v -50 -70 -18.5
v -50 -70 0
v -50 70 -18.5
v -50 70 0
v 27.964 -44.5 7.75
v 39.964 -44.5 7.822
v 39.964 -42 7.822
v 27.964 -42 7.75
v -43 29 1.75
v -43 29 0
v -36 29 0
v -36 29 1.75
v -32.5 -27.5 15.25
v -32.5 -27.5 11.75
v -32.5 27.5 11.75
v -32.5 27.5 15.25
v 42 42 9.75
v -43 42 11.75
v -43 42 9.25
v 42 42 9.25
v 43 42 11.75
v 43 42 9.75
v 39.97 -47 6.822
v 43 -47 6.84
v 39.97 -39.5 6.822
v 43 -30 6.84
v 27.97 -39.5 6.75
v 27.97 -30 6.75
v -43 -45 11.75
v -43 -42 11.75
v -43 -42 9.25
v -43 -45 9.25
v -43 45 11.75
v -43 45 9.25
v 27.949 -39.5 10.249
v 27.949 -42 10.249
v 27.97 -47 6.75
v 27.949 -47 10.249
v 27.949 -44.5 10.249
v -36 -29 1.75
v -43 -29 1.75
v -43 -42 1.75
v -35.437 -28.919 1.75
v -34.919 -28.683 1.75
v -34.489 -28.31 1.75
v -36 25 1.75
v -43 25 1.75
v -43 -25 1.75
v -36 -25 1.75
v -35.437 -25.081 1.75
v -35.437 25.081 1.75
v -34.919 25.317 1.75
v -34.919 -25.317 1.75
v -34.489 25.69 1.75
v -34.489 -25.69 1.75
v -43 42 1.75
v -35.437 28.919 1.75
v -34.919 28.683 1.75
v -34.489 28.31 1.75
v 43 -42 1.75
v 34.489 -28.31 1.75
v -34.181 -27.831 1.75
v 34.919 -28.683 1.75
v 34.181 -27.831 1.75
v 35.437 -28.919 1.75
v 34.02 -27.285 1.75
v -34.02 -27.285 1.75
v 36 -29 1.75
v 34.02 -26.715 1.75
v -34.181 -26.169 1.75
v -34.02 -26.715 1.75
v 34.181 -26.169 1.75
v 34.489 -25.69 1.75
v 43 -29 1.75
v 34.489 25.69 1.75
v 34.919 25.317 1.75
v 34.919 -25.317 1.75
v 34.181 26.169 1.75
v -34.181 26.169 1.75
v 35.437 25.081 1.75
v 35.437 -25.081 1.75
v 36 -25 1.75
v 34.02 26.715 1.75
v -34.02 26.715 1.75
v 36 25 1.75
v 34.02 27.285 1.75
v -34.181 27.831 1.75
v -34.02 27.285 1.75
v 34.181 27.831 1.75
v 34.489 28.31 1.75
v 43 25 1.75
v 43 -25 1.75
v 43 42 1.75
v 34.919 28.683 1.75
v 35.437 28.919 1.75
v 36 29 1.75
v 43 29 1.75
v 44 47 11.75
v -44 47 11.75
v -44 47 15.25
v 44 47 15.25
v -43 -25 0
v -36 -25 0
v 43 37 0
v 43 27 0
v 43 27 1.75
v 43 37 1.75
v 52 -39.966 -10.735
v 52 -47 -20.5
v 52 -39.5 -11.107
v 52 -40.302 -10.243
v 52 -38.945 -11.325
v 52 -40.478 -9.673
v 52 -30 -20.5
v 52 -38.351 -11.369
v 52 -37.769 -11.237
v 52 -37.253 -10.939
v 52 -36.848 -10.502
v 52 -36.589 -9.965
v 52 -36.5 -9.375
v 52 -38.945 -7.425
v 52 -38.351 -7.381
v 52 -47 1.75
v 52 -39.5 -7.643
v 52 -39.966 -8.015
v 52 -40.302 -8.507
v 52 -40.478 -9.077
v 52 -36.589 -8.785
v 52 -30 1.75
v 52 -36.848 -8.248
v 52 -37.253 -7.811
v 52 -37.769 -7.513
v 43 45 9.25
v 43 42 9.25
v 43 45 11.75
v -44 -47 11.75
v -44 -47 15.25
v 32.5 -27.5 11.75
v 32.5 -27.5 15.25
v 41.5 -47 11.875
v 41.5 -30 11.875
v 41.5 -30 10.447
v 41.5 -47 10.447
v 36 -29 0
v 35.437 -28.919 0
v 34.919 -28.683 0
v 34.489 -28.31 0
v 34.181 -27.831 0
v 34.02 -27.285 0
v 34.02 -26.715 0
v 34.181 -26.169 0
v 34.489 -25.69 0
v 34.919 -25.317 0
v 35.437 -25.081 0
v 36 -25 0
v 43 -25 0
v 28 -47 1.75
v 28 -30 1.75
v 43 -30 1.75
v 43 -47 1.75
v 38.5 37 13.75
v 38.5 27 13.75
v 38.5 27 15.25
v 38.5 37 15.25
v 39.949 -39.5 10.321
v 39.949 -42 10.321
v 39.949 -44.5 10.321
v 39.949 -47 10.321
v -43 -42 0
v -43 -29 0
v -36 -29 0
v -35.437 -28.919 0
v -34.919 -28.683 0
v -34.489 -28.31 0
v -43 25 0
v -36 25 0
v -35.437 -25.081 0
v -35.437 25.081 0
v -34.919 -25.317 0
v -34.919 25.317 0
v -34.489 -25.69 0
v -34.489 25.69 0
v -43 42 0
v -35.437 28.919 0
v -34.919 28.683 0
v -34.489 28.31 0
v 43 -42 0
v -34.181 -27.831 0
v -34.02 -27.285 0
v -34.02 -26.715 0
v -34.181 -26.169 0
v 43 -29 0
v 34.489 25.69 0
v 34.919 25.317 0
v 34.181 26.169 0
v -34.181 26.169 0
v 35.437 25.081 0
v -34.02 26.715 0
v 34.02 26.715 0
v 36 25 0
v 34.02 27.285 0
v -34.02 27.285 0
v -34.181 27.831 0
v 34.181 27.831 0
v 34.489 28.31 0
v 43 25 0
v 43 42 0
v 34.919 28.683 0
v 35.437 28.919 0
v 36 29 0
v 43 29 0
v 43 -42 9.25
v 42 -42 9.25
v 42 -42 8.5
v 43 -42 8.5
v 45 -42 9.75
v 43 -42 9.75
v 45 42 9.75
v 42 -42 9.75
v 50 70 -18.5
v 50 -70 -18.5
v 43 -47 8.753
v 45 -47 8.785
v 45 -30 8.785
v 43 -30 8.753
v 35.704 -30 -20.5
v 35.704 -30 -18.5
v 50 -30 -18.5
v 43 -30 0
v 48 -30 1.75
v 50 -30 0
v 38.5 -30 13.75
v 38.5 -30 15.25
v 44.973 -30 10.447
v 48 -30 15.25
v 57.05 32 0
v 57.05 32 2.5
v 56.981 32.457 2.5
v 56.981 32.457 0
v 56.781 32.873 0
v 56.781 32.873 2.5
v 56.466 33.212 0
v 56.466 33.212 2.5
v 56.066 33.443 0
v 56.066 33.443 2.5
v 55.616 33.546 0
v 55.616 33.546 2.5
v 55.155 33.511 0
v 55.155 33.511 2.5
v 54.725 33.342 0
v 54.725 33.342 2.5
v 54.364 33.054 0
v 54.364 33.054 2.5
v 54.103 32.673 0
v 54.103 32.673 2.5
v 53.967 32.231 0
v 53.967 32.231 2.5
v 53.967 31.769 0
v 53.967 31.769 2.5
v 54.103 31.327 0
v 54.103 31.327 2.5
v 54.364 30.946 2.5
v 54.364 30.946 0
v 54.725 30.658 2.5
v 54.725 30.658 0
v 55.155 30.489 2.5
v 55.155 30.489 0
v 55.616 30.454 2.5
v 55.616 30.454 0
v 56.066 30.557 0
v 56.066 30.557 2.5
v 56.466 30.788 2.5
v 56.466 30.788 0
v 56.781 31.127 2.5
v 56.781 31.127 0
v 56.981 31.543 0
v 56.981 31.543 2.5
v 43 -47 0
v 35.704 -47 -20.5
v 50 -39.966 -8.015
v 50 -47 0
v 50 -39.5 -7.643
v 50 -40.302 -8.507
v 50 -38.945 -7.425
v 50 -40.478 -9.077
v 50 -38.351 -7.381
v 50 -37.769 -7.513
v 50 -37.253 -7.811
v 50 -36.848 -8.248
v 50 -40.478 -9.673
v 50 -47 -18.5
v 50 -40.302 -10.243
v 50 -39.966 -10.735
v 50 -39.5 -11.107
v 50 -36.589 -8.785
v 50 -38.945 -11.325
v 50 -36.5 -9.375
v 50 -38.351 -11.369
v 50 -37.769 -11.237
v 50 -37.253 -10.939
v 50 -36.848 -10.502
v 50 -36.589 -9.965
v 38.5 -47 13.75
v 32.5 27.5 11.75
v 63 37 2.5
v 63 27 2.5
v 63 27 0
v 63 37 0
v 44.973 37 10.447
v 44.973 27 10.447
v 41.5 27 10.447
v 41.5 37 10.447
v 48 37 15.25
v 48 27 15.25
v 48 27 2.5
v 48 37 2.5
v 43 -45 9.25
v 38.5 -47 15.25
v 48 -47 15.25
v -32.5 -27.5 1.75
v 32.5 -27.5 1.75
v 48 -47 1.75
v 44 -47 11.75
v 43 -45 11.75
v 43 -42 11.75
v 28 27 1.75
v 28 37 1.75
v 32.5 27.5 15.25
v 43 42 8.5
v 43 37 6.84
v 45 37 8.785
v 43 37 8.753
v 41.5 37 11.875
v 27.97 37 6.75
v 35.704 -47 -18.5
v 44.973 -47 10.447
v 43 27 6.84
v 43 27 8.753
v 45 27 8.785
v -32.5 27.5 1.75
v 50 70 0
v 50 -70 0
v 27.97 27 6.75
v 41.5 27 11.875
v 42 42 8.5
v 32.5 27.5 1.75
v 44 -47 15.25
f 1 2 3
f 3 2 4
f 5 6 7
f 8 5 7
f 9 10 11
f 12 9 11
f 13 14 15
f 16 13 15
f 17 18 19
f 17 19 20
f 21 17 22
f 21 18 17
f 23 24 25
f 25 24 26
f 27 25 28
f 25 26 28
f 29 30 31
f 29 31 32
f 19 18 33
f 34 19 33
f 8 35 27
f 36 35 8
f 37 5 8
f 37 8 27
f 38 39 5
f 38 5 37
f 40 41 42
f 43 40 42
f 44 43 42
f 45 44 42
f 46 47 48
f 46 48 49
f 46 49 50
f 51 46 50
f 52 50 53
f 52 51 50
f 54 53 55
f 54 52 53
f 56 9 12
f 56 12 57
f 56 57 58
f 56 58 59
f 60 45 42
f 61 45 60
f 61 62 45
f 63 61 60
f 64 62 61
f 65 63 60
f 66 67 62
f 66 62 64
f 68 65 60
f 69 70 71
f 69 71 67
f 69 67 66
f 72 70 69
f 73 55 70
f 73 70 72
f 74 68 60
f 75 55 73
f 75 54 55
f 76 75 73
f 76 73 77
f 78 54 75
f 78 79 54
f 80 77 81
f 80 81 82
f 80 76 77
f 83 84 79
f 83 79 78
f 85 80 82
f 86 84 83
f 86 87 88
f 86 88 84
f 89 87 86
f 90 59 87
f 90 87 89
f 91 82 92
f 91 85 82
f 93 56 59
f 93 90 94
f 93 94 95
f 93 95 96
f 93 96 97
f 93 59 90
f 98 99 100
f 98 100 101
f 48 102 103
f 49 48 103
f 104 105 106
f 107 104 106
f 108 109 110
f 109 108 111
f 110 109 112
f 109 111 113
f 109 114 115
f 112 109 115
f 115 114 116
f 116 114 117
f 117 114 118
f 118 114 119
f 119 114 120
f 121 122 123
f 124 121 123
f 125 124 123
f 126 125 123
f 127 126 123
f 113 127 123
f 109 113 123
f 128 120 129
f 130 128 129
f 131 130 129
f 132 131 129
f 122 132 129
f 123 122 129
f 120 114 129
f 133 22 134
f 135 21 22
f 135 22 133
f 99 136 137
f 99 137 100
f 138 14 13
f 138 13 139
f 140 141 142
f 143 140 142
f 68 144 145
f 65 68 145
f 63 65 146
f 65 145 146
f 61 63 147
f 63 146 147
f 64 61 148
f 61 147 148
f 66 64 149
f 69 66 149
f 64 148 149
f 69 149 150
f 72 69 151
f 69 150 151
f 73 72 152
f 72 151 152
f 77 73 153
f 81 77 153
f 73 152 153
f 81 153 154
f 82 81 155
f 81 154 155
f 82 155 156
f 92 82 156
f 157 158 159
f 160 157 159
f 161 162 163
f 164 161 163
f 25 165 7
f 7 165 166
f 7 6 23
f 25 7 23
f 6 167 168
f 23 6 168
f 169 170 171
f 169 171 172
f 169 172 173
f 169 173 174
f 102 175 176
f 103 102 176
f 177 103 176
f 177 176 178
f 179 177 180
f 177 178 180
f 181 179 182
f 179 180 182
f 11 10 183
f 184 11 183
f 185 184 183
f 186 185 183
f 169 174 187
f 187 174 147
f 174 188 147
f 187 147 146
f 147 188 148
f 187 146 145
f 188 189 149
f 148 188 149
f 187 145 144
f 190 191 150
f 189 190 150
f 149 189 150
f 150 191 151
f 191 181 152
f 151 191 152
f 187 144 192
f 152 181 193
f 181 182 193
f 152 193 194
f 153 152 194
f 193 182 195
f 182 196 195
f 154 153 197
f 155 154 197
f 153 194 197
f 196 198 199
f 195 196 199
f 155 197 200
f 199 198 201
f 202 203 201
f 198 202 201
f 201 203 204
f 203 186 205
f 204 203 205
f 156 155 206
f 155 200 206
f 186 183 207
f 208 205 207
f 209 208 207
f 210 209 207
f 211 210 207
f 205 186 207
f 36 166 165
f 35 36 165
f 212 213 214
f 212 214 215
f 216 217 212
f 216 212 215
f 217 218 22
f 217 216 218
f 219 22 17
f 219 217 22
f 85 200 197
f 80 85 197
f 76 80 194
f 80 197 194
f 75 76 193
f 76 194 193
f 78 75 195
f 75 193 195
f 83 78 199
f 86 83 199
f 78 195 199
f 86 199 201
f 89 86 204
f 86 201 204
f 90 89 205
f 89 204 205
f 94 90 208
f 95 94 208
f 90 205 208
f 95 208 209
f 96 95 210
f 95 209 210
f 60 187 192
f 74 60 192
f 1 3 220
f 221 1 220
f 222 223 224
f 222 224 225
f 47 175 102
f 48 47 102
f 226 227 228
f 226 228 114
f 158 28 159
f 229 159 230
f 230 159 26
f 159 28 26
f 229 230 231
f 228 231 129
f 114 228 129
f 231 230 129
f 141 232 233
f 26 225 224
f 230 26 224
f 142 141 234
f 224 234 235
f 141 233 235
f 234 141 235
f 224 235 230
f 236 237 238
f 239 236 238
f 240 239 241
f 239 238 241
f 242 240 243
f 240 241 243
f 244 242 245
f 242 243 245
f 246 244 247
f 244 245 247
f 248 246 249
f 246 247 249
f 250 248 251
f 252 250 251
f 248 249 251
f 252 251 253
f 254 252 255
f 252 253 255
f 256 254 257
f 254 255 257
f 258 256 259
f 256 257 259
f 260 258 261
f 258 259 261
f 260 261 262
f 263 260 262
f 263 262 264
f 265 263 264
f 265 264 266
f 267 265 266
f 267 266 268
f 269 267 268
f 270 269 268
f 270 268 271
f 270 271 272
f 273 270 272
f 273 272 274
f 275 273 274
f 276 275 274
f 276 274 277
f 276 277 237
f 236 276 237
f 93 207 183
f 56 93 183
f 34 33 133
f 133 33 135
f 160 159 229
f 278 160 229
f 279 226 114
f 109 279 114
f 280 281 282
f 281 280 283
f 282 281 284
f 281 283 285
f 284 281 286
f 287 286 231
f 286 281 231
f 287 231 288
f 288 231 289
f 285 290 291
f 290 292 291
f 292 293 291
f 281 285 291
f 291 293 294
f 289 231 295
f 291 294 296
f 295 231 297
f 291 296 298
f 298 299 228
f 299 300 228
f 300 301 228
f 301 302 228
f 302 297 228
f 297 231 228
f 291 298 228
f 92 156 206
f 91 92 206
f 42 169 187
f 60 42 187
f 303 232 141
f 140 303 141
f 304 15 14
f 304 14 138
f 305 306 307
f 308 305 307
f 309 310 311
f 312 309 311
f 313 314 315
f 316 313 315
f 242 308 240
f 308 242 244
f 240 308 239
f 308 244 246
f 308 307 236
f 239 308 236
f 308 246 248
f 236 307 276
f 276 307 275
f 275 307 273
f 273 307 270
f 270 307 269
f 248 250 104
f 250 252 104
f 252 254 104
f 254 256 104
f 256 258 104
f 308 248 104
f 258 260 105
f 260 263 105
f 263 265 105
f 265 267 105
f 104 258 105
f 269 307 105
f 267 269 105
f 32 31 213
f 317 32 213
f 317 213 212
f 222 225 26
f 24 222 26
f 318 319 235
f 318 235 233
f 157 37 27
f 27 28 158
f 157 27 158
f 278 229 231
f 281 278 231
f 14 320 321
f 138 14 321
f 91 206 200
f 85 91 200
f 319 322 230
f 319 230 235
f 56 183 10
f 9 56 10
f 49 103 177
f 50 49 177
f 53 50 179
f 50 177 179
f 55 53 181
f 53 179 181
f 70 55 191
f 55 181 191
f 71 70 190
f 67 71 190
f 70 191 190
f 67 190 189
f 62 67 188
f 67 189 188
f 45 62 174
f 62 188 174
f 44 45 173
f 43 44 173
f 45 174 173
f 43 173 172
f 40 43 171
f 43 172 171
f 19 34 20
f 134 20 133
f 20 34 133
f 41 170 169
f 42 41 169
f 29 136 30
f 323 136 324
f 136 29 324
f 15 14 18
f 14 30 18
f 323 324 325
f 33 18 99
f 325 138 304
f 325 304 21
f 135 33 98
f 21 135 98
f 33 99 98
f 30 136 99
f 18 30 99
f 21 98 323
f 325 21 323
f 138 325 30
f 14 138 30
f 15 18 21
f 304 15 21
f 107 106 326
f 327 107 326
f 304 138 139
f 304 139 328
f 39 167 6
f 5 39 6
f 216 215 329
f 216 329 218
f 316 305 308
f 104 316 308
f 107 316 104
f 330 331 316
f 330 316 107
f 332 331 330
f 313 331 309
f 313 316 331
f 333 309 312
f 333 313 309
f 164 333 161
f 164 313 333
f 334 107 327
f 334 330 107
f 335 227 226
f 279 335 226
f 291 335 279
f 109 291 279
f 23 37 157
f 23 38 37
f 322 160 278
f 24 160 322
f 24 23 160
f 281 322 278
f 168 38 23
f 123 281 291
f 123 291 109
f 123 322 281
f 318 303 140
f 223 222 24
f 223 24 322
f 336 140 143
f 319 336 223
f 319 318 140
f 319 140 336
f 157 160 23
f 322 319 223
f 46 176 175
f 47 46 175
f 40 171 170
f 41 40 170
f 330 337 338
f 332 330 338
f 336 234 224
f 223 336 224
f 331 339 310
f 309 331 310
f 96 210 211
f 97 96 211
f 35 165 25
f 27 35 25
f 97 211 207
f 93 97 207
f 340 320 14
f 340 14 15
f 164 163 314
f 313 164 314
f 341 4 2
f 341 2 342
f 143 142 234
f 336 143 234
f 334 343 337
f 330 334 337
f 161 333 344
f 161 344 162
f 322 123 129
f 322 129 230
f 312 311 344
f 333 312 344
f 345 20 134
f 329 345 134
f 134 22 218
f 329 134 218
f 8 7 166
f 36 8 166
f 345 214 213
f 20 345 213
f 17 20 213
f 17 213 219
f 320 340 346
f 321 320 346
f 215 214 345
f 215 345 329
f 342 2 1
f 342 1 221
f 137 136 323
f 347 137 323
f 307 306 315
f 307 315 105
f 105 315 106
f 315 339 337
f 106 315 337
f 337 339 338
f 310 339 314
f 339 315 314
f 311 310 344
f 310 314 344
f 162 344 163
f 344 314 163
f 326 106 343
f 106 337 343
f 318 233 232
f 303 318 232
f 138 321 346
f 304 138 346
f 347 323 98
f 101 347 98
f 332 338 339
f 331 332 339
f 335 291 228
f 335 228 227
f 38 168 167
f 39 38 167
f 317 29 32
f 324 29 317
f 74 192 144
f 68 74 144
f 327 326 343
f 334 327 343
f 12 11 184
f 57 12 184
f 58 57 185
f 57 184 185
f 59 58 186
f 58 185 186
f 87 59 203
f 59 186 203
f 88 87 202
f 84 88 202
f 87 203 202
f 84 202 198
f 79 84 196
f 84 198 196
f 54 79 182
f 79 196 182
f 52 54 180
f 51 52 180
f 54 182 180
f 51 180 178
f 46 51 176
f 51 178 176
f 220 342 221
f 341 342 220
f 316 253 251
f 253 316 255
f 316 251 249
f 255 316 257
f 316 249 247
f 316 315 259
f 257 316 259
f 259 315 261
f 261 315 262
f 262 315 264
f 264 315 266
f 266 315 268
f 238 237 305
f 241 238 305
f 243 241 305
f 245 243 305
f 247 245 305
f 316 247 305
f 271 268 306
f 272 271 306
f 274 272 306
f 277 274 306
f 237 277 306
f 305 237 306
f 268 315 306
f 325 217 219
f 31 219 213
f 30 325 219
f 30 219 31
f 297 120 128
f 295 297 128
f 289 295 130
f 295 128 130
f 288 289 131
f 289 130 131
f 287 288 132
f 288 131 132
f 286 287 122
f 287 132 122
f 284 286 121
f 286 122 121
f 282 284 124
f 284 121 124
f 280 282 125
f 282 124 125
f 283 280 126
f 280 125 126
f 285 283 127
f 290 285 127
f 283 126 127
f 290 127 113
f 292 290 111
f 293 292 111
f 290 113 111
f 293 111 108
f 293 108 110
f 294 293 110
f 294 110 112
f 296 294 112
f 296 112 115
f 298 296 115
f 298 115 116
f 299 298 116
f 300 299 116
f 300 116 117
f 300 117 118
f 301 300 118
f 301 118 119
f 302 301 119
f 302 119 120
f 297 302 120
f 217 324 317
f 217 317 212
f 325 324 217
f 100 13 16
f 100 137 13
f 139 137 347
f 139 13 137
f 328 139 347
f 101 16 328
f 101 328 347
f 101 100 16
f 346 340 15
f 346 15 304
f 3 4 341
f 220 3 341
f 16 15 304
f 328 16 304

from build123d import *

# Parameters (mm, degrees)
F0_W           = 100
F0_H           = 140
F1_DEPTH       = 18.5
F3_DEPTH       = 1.75
F4_W           = 65
F4_H           = 55
F5_DEPTH       = 10
F6_W           = 88
F6_H           = 94
F6_W_2         = 86
F6_H_2         = 84
F6_W_3         = 65
F6_H_3         = 55
F6_H_4         = 3
F7_DEPTH       = 3.5
F8_DEPTH       = 2.5
F9_W           = 1
F9_H           = 1.25
F10_DEPTH      = 42
F10_DEPTH_BACK = 42
F12_DEPTH      = 47
F13_DEPTH      = 30
F15_DEPTH      = 12
F16_R          = 2
F17_DEPTH      = 3
F20_DEPTH      = 10
F21_R          = 1.55
F22_DEPTH      = 25


with BuildPart() as f1:
    # F0 (on Top) → F1 (new body)
    with BuildSketch(Plane.XY):
        Rectangle(F0_W, F0_H)
    extrude(amount=-F1_DEPTH)


with BuildPart() as f3:
    # F2 (on Top) → F3 (new body)
    with BuildSketch(Plane.XY):
        with BuildLine():
            Line((43, 42), (-43, 42))
            Line((-43, 42), (-43, 29))
            Line((-43, 29), (-36, 29))
            ThreePointArc((-36, 29), (-34, 27), (-36, 25))
            Line((-36, 25), (-43, 25))
            Line((-43, 25), (-43, -25))
            Line((-43, -25), (-36, -25))
            ThreePointArc((-36, -25), (-34, -27), (-36, -29))
            Line((-36, -29), (-43, -29))
            Line((-43, -29), (-43, -42))
            Line((-43, -42), (43, -42))
            Line((43, -42), (43, -29))
            Line((43, -29), (36, -29))
            ThreePointArc((36, -29), (34, -27), (36, -25))
            Line((36, -25), (43, -25))
            Line((43, -25), (43, 25))
            Line((43, 25), (36, 25))
            ThreePointArc((36, 25), (34, 27), (36, 29))
            Line((36, 29), (43, 29))
            Line((43, 29), (43, 42))
        make_face()
    extrude(amount=F3_DEPTH)


with BuildPart() as f5:
    # F4 (on face) → F5 (new body)
    with BuildSketch(Plane.XY.offset(1.75)):
        Rectangle(F4_W, F4_H)
    extrude(amount=F5_DEPTH)


with BuildPart() as f7:
    # F6 (on face) → F7 (new body)
    with BuildSketch(Plane.XY.offset(11.75)):
        Rectangle(F6_W, F6_H)
        Polygon((-43, 42), (-43, 45), (43, 45), (43, 42), (43, -42), (43, -44), (43, -45), (-43, -45), (-43, -44), (-43, -42), align=None, mode=Mode.SUBTRACT)
        Rectangle(F6_W_2, F6_H_2)
        Rectangle(F6_W_3, F6_H_3, mode=Mode.SUBTRACT)
        with Locations((0, 43.5)):
            Rectangle(F6_W_2, F6_H_4)
        Polygon((43, -42), (-43, -42), (-43, -44), (-43, -45), (43, -45), (43, -44), align=None)
    extrude(amount=F7_DEPTH)

    # F6 (on face) → F8 (join)
    with BuildSketch(Plane.XY.offset(11.75)):
        with Locations((0, 43.5)):
            Rectangle(F6_W_2, F6_H_4)
        Polygon((43, -42), (-43, -42), (-43, -44), (-43, -45), (43, -45), (43, -44), align=None)
    extrude(amount=-F8_DEPTH)

    # F9 (on Front) → F10 (join, two sides)
    with BuildSketch(Plane.XZ) as f10_sk:
        with Locations((42.5, 9.125)):
            Rectangle(F9_W, F9_H)
        Polygon((43, 9.75), (43, 8.5), (45, 9.75), align=None)
    extrude(amount=F10_DEPTH)
    extrude(f10_sk.sketch, amount=-F10_DEPTH_BACK)


with BuildPart() as f12:
    # F11 (on Front) → F12 (new body)
    with BuildSketch(Plane.XZ):
        Polygon((27.9699712028, 6.7499098263), (28, 1.75), (43, 1.75), (43, 0), (48, 0), (50, 0), (52, 0), (52, 1.75), (48, 1.75), (48, 13.75), (48, 15.25), (38.5, 15.25), (38.5, 13.75), (41.5, 11.875), (41.5, 10.4472711682), (44.9731051922, 10.4472711682), (45, 8.7854899466), (43, 8.7531212961), (43, 6.8401781918), align=None)
        Polygon((52, 0), (50, 0), (50, -18.5), (35.7036739588, -18.5), (35.7036739588, -20.5), (52, -20.5), align=None)
    extrude(amount=F12_DEPTH)

    # F11 (on Front) → F13 (cut)
    with BuildSketch(Plane.XZ):
        Polygon((27.9699712028, 6.7499098263), (28, 1.75), (43, 1.75), (43, 0), (48, 0), (50, 0), (52, 0), (52, 1.75), (48, 1.75), (48, 13.75), (48, 15.25), (38.5, 15.25), (38.5, 13.75), (41.5, 11.875), (41.5, 10.4472711682), (44.9731051922, 10.4472711682), (45, 8.7854899466), (43, 8.7531212961), (43, 6.8401781918), align=None)
        Polygon((52, 0), (50, 0), (50, -18.5), (35.7036739588, -18.5), (35.7036739588, -20.5), (52, -20.5), align=None)
    extrude(amount=F13_DEPTH, mode=Mode.SUBTRACT)

    # F14 (on face) → F15 (join)
    with BuildSketch(Plane(origin=(28.0094999534, 0, 0.1682213529), x_dir=(0, -1, 0), z_dir=(-0.9999819653, 0, -0.0060057594))):
        Polygon((39.5, 5.9370710514), (47, 5.9370710514), (47, 7.0816674463), (47, 10.0810629427), (44.5, 10.0810629427), (44.5, 7.5816674463), (42, 7.5816674463), (42, 9.5810629427), (42, 10.0810629427), (39.5, 10.0810629427), (39.5, 9.5810629427), align=None)
    extrude(amount=-F15_DEPTH)

    # F16 (on face) → F17 (cut)
    with BuildSketch(Plane.YZ.offset(52)):
        with Locations((-38.5, -9.375)):
            Circle(F16_R)
    extrude(amount=-F17_DEPTH, mode=Mode.SUBTRACT)


with BuildPart() as f20:
    # F19 (on offset) → F20 (new body)
    with BuildSketch(Plane(origin=(0, 27, 0), x_dir=(-1, 0, 0), z_dir=(0, 1, 0))):
        Polygon((-43, 1.75), (-28, 1.75), (-27.9699712028, 6.7499098263), (-43, 6.8401781918), (-43, 8.7531212961), (-45, 8.7854899466), (-44.9731051922, 10.4472711682), (-41.5, 10.4472711682), (-41.5, 11.875), (-38.5, 13.75), (-38.5, 15.25), (-48, 15.25), (-48, 2.5), (-63, 2.5), (-63, 0), (-43, 0), align=None)
    extrude(amount=F20_DEPTH)

    # F21 (on face) → F22 (cut)
    with BuildSketch(Plane.XY.offset(2.5)):
        with Locations((55.5, 32)):
            Circle(F21_R)
    extrude(amount=-F22_DEPTH, mode=Mode.SUBTRACT)


solid = Compound([f1.part, f3.part, f5.part, f7.part, f12.part, f20.part])
